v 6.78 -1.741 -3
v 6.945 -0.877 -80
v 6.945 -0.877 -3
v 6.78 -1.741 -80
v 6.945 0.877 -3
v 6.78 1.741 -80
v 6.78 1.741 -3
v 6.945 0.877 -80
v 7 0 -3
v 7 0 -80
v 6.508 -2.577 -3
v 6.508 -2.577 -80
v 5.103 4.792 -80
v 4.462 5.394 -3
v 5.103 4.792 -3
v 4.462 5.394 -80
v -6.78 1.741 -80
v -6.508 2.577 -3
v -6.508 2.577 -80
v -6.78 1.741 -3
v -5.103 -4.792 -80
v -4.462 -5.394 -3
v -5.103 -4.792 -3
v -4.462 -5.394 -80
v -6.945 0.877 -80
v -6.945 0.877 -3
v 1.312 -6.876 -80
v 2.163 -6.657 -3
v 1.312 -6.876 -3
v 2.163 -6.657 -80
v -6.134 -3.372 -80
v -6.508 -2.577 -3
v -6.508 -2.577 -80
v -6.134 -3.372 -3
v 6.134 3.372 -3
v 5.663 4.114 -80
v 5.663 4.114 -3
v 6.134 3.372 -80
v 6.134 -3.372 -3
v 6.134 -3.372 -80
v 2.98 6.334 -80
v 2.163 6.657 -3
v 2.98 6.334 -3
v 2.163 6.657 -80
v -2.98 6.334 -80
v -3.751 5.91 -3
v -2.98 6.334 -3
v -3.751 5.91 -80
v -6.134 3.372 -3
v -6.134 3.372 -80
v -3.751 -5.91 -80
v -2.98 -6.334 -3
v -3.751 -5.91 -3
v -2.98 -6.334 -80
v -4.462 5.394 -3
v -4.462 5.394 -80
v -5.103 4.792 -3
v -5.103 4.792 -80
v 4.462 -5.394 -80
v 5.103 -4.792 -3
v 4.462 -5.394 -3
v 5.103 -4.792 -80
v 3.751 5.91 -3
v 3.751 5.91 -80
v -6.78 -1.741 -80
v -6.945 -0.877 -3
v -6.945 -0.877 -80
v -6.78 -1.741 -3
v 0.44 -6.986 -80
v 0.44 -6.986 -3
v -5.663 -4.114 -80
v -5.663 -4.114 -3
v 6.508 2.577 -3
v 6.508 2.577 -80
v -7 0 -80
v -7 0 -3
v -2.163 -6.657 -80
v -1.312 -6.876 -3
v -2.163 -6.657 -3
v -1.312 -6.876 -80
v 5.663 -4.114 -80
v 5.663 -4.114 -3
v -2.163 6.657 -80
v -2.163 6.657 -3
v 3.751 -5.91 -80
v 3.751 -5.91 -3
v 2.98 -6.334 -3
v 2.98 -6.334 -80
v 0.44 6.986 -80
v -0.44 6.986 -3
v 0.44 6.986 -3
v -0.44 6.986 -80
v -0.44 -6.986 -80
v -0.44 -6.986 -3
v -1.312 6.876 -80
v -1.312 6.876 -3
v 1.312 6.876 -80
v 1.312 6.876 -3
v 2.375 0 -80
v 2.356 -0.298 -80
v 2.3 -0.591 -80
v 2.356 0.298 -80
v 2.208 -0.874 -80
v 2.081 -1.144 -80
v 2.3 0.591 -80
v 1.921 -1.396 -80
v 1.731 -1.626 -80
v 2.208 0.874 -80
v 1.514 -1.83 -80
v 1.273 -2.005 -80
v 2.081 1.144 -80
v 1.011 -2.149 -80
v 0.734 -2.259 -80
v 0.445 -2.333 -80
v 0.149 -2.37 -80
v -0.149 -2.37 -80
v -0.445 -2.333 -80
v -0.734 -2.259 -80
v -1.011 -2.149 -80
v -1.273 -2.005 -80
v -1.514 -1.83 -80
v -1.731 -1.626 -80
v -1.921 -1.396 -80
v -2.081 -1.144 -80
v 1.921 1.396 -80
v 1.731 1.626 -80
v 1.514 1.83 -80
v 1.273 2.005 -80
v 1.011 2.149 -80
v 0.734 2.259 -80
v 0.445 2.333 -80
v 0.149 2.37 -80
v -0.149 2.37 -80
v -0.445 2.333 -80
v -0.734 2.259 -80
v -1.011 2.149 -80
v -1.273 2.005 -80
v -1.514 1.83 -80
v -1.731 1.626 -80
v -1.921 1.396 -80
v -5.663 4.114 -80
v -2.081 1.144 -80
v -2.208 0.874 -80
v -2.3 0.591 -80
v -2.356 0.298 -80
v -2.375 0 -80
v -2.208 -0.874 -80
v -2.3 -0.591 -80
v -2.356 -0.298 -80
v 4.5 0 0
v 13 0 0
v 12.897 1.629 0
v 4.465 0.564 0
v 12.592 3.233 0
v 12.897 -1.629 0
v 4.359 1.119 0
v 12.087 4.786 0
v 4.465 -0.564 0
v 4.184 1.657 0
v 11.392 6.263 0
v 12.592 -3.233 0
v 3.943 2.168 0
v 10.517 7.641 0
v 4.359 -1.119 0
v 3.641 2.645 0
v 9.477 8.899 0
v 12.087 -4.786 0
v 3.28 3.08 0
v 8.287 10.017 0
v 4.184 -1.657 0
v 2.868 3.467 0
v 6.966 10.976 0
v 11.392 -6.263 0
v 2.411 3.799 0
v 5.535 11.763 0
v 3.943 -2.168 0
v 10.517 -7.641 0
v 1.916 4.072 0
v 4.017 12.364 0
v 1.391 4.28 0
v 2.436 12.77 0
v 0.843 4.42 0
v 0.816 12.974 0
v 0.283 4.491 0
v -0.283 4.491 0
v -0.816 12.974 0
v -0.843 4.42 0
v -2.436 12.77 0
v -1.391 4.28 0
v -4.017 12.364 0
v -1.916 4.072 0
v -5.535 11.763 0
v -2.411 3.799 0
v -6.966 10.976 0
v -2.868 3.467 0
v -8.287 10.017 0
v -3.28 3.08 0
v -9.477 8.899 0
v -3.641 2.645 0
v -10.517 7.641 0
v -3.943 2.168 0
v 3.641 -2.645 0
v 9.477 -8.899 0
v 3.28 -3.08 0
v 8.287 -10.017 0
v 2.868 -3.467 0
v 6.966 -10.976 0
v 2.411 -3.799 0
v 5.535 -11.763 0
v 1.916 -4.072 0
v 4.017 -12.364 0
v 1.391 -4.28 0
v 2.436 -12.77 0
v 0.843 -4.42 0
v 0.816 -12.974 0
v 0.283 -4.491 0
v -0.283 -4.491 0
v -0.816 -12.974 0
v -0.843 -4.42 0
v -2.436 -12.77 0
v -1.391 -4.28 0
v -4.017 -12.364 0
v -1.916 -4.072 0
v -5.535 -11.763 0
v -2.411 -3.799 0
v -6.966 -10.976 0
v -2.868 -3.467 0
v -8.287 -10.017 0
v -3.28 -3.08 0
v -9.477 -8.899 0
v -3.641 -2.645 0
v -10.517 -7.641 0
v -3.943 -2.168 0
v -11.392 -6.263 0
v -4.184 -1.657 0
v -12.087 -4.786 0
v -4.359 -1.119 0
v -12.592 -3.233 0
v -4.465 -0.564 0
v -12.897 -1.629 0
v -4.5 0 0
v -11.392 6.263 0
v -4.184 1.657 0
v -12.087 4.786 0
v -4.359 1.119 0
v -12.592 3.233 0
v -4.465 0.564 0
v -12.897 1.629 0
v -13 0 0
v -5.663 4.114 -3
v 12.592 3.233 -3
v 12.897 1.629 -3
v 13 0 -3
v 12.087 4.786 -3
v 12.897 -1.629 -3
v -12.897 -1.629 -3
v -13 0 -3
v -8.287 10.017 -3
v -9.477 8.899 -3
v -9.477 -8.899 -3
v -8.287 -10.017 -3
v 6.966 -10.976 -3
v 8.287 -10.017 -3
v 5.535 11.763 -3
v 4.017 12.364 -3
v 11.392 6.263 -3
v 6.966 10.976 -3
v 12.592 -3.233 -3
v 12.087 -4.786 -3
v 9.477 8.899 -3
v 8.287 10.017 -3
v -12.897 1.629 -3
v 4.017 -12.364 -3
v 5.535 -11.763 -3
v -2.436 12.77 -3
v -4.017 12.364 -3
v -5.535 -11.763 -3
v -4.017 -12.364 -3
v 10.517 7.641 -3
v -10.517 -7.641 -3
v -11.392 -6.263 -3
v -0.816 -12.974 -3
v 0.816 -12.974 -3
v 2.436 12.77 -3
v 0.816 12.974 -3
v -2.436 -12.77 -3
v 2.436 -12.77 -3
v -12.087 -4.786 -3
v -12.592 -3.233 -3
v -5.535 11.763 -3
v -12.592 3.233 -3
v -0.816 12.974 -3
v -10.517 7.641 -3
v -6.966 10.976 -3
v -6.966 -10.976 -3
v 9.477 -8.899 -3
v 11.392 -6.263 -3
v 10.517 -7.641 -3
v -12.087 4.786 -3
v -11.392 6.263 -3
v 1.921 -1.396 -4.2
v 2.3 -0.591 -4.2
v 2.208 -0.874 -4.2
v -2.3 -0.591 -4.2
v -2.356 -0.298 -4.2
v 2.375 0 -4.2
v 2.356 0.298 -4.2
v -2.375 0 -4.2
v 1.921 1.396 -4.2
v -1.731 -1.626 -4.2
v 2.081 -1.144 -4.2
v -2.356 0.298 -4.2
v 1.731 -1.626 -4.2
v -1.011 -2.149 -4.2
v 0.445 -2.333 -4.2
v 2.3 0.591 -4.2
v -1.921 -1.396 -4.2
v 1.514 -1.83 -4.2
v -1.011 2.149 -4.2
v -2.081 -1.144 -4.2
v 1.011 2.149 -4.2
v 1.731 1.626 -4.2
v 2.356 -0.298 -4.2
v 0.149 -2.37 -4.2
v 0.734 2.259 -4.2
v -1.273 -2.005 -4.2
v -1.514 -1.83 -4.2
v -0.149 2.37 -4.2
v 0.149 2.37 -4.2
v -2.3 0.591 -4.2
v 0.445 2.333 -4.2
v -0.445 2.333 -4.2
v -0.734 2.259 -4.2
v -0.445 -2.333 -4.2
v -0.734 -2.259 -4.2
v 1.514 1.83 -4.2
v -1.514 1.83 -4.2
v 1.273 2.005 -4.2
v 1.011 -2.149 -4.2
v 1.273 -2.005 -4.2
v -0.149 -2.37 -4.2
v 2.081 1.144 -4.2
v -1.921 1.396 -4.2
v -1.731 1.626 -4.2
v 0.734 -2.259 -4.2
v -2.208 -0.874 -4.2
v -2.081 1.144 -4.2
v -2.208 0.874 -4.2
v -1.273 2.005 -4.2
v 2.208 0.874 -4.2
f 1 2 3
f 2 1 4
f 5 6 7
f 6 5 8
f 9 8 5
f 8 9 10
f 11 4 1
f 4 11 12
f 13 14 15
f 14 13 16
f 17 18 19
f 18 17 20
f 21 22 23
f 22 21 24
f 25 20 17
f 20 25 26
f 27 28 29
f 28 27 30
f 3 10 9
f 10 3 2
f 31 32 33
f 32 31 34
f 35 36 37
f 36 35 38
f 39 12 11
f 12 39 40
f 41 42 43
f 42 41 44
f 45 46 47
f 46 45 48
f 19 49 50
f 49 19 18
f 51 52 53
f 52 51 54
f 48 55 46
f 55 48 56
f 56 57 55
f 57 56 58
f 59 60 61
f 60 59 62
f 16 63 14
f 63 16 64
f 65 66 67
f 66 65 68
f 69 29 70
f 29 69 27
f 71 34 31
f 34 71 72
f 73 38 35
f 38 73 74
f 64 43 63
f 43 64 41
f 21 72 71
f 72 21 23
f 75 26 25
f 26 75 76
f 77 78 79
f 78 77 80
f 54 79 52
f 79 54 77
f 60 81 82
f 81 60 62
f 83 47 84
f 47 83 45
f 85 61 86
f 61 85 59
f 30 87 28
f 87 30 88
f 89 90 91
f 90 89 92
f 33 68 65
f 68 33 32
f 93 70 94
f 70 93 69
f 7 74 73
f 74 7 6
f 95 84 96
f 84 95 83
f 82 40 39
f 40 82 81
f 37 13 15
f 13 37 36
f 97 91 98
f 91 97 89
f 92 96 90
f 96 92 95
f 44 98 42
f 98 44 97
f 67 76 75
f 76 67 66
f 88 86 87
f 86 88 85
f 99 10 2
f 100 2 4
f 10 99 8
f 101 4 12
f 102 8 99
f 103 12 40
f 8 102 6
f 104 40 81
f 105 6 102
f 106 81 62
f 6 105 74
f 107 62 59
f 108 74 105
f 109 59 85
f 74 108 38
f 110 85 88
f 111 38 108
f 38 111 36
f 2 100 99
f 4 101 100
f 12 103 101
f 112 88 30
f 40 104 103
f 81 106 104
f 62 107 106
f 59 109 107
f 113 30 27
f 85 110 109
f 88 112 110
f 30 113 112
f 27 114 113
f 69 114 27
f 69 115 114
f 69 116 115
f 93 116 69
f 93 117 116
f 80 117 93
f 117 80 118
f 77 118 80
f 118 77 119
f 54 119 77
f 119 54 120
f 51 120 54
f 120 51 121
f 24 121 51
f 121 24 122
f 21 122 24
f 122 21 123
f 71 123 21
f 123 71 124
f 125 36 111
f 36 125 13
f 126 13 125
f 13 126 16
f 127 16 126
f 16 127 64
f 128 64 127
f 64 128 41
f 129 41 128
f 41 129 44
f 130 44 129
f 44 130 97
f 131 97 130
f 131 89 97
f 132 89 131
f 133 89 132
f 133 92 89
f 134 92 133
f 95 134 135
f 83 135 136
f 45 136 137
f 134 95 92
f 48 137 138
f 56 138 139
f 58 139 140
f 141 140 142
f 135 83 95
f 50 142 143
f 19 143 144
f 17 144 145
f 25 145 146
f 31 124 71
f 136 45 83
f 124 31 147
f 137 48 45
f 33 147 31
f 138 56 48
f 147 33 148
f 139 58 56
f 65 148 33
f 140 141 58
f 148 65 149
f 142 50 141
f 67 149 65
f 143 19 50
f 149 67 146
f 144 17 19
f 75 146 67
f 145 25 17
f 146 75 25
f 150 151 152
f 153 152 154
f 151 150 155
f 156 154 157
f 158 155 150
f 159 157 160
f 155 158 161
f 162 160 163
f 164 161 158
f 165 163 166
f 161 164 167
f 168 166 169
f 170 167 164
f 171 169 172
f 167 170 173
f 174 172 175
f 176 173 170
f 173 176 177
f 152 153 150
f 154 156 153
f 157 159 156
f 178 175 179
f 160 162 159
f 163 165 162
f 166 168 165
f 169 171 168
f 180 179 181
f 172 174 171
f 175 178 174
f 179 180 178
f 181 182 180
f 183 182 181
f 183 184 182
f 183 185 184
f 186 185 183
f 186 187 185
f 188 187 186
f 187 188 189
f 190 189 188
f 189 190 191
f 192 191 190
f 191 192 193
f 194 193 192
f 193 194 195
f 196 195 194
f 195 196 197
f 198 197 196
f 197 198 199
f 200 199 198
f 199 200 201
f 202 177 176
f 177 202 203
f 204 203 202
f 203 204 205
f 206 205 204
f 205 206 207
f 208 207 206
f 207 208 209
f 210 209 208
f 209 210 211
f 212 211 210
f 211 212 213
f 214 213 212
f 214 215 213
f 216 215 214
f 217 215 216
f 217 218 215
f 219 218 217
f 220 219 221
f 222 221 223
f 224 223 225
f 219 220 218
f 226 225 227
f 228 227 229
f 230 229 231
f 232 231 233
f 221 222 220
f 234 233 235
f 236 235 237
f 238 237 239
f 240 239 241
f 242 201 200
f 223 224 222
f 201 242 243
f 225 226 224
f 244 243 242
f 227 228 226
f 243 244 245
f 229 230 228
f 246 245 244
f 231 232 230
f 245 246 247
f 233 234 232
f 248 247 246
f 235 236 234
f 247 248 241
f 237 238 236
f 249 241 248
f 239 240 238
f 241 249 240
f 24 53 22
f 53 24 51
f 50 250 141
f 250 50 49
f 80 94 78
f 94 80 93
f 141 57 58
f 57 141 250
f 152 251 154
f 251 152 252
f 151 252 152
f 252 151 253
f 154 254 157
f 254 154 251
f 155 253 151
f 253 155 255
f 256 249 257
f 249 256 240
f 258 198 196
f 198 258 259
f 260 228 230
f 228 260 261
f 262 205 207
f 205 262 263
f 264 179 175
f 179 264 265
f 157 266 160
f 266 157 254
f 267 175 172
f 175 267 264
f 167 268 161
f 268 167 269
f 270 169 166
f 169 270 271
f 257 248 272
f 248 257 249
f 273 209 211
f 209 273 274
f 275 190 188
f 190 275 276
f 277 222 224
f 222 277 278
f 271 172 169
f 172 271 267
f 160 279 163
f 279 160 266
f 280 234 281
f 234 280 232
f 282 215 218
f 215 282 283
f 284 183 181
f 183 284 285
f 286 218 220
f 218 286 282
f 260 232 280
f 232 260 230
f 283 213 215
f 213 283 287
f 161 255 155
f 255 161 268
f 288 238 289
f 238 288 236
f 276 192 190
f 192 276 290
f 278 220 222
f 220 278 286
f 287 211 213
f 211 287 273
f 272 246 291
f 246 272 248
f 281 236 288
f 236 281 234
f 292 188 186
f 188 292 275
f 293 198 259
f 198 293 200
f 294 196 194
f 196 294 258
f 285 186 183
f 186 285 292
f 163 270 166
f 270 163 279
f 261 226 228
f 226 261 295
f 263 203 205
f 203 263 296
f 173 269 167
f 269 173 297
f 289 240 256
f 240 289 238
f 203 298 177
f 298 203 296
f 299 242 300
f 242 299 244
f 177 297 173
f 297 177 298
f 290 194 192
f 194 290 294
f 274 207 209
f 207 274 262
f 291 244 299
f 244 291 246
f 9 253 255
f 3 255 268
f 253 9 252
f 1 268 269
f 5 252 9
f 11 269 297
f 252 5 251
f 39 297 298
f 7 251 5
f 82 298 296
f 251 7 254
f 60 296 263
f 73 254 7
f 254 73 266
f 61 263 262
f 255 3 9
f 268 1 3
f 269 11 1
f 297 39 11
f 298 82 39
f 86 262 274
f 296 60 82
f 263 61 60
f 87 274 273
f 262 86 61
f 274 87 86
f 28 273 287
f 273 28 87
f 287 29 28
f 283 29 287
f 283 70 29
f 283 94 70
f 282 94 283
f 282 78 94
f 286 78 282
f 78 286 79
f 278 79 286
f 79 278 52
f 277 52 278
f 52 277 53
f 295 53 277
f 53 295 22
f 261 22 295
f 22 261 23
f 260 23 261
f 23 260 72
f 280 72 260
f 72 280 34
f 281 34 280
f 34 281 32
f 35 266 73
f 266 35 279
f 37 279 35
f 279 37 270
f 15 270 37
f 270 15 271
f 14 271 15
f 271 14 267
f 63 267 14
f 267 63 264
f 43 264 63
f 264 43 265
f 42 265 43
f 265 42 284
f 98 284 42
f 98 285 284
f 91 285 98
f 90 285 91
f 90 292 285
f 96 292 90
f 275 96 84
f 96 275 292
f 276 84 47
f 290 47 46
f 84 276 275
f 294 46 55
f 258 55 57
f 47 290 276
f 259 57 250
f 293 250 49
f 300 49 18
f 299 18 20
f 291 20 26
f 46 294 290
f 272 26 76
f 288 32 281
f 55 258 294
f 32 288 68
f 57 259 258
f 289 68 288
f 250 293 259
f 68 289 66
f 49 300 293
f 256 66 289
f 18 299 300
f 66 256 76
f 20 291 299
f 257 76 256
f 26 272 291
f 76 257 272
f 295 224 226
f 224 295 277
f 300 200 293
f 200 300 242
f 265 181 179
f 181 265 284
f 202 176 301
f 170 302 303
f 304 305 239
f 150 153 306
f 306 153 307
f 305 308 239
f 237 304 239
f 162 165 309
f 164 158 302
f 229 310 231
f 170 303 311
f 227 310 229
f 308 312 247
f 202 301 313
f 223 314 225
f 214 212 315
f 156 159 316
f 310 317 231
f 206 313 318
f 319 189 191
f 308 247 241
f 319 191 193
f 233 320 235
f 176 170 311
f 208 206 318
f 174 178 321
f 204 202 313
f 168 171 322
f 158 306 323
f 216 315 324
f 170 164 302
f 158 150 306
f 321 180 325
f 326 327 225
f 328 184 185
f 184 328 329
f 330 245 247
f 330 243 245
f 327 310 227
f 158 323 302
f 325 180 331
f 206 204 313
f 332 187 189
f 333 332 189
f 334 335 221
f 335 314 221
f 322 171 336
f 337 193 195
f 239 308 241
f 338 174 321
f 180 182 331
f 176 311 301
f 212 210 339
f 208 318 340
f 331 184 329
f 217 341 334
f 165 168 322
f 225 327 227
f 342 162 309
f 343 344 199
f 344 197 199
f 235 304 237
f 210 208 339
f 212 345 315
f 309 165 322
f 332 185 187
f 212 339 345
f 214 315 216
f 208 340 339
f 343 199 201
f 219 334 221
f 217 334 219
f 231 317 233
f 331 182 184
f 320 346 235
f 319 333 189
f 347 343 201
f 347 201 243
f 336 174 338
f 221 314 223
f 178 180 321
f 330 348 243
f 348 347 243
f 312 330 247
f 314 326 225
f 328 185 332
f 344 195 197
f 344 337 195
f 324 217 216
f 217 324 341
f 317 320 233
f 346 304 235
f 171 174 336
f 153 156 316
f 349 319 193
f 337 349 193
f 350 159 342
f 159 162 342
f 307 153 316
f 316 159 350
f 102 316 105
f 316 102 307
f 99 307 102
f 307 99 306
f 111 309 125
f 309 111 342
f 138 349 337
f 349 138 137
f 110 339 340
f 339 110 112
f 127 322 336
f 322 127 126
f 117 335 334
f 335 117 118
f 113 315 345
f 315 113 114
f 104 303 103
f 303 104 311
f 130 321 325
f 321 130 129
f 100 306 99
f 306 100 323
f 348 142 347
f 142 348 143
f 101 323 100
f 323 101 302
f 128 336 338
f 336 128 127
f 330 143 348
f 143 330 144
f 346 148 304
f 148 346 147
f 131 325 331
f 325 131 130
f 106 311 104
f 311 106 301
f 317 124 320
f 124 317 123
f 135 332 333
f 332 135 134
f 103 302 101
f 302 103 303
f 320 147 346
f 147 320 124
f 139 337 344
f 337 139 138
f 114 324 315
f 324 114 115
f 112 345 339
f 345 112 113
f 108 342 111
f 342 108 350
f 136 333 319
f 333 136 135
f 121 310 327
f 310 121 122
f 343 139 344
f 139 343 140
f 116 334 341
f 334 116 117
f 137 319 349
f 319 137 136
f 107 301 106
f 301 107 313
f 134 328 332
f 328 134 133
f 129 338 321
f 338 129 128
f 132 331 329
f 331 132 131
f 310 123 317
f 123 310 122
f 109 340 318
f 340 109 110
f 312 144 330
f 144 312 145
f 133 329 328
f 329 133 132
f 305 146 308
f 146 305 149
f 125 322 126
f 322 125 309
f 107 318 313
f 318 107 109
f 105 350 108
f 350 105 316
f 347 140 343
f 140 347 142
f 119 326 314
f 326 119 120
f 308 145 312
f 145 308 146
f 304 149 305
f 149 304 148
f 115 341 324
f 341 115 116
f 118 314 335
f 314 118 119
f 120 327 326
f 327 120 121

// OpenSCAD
$fn = 50;


difference() {
	union() {
		translate(v = [0, 0, -80.0000000000]) {
			cylinder(h = 80, r = 7.0000000000);
		}
		translate(v = [0, 0, -3.0000000000]) {
			cylinder(h = 3, r = 13.0000000000);
		}
	}
	union() {
		translate(v = [0, 0, 0]) {
			rotate(a = [0, 0, 0]) {
				difference() {
					union() {
						#translate(v = [0, 0, -80.0000000000]) {
							cylinder(h = 80, r = 2.2500000000);
						}
						#translate(v = [0, 0, -4.2000000000]) {
							cylinder(h = 4.2000000000, r = 7.0000000000, r1 = 2.3750000000, r2 = 4.5000000000);
						}
						#translate(v = [0, 0, -80.0000000000]) {
							cylinder(h = 80, r = 2.3750000000);
						}
						#translate(v = [0, 0, -80.0000000000]) {
							cylinder(h = 80, r = 2.2500000000);
						}
					}
					union();
				}
			}
		}
	}
}
